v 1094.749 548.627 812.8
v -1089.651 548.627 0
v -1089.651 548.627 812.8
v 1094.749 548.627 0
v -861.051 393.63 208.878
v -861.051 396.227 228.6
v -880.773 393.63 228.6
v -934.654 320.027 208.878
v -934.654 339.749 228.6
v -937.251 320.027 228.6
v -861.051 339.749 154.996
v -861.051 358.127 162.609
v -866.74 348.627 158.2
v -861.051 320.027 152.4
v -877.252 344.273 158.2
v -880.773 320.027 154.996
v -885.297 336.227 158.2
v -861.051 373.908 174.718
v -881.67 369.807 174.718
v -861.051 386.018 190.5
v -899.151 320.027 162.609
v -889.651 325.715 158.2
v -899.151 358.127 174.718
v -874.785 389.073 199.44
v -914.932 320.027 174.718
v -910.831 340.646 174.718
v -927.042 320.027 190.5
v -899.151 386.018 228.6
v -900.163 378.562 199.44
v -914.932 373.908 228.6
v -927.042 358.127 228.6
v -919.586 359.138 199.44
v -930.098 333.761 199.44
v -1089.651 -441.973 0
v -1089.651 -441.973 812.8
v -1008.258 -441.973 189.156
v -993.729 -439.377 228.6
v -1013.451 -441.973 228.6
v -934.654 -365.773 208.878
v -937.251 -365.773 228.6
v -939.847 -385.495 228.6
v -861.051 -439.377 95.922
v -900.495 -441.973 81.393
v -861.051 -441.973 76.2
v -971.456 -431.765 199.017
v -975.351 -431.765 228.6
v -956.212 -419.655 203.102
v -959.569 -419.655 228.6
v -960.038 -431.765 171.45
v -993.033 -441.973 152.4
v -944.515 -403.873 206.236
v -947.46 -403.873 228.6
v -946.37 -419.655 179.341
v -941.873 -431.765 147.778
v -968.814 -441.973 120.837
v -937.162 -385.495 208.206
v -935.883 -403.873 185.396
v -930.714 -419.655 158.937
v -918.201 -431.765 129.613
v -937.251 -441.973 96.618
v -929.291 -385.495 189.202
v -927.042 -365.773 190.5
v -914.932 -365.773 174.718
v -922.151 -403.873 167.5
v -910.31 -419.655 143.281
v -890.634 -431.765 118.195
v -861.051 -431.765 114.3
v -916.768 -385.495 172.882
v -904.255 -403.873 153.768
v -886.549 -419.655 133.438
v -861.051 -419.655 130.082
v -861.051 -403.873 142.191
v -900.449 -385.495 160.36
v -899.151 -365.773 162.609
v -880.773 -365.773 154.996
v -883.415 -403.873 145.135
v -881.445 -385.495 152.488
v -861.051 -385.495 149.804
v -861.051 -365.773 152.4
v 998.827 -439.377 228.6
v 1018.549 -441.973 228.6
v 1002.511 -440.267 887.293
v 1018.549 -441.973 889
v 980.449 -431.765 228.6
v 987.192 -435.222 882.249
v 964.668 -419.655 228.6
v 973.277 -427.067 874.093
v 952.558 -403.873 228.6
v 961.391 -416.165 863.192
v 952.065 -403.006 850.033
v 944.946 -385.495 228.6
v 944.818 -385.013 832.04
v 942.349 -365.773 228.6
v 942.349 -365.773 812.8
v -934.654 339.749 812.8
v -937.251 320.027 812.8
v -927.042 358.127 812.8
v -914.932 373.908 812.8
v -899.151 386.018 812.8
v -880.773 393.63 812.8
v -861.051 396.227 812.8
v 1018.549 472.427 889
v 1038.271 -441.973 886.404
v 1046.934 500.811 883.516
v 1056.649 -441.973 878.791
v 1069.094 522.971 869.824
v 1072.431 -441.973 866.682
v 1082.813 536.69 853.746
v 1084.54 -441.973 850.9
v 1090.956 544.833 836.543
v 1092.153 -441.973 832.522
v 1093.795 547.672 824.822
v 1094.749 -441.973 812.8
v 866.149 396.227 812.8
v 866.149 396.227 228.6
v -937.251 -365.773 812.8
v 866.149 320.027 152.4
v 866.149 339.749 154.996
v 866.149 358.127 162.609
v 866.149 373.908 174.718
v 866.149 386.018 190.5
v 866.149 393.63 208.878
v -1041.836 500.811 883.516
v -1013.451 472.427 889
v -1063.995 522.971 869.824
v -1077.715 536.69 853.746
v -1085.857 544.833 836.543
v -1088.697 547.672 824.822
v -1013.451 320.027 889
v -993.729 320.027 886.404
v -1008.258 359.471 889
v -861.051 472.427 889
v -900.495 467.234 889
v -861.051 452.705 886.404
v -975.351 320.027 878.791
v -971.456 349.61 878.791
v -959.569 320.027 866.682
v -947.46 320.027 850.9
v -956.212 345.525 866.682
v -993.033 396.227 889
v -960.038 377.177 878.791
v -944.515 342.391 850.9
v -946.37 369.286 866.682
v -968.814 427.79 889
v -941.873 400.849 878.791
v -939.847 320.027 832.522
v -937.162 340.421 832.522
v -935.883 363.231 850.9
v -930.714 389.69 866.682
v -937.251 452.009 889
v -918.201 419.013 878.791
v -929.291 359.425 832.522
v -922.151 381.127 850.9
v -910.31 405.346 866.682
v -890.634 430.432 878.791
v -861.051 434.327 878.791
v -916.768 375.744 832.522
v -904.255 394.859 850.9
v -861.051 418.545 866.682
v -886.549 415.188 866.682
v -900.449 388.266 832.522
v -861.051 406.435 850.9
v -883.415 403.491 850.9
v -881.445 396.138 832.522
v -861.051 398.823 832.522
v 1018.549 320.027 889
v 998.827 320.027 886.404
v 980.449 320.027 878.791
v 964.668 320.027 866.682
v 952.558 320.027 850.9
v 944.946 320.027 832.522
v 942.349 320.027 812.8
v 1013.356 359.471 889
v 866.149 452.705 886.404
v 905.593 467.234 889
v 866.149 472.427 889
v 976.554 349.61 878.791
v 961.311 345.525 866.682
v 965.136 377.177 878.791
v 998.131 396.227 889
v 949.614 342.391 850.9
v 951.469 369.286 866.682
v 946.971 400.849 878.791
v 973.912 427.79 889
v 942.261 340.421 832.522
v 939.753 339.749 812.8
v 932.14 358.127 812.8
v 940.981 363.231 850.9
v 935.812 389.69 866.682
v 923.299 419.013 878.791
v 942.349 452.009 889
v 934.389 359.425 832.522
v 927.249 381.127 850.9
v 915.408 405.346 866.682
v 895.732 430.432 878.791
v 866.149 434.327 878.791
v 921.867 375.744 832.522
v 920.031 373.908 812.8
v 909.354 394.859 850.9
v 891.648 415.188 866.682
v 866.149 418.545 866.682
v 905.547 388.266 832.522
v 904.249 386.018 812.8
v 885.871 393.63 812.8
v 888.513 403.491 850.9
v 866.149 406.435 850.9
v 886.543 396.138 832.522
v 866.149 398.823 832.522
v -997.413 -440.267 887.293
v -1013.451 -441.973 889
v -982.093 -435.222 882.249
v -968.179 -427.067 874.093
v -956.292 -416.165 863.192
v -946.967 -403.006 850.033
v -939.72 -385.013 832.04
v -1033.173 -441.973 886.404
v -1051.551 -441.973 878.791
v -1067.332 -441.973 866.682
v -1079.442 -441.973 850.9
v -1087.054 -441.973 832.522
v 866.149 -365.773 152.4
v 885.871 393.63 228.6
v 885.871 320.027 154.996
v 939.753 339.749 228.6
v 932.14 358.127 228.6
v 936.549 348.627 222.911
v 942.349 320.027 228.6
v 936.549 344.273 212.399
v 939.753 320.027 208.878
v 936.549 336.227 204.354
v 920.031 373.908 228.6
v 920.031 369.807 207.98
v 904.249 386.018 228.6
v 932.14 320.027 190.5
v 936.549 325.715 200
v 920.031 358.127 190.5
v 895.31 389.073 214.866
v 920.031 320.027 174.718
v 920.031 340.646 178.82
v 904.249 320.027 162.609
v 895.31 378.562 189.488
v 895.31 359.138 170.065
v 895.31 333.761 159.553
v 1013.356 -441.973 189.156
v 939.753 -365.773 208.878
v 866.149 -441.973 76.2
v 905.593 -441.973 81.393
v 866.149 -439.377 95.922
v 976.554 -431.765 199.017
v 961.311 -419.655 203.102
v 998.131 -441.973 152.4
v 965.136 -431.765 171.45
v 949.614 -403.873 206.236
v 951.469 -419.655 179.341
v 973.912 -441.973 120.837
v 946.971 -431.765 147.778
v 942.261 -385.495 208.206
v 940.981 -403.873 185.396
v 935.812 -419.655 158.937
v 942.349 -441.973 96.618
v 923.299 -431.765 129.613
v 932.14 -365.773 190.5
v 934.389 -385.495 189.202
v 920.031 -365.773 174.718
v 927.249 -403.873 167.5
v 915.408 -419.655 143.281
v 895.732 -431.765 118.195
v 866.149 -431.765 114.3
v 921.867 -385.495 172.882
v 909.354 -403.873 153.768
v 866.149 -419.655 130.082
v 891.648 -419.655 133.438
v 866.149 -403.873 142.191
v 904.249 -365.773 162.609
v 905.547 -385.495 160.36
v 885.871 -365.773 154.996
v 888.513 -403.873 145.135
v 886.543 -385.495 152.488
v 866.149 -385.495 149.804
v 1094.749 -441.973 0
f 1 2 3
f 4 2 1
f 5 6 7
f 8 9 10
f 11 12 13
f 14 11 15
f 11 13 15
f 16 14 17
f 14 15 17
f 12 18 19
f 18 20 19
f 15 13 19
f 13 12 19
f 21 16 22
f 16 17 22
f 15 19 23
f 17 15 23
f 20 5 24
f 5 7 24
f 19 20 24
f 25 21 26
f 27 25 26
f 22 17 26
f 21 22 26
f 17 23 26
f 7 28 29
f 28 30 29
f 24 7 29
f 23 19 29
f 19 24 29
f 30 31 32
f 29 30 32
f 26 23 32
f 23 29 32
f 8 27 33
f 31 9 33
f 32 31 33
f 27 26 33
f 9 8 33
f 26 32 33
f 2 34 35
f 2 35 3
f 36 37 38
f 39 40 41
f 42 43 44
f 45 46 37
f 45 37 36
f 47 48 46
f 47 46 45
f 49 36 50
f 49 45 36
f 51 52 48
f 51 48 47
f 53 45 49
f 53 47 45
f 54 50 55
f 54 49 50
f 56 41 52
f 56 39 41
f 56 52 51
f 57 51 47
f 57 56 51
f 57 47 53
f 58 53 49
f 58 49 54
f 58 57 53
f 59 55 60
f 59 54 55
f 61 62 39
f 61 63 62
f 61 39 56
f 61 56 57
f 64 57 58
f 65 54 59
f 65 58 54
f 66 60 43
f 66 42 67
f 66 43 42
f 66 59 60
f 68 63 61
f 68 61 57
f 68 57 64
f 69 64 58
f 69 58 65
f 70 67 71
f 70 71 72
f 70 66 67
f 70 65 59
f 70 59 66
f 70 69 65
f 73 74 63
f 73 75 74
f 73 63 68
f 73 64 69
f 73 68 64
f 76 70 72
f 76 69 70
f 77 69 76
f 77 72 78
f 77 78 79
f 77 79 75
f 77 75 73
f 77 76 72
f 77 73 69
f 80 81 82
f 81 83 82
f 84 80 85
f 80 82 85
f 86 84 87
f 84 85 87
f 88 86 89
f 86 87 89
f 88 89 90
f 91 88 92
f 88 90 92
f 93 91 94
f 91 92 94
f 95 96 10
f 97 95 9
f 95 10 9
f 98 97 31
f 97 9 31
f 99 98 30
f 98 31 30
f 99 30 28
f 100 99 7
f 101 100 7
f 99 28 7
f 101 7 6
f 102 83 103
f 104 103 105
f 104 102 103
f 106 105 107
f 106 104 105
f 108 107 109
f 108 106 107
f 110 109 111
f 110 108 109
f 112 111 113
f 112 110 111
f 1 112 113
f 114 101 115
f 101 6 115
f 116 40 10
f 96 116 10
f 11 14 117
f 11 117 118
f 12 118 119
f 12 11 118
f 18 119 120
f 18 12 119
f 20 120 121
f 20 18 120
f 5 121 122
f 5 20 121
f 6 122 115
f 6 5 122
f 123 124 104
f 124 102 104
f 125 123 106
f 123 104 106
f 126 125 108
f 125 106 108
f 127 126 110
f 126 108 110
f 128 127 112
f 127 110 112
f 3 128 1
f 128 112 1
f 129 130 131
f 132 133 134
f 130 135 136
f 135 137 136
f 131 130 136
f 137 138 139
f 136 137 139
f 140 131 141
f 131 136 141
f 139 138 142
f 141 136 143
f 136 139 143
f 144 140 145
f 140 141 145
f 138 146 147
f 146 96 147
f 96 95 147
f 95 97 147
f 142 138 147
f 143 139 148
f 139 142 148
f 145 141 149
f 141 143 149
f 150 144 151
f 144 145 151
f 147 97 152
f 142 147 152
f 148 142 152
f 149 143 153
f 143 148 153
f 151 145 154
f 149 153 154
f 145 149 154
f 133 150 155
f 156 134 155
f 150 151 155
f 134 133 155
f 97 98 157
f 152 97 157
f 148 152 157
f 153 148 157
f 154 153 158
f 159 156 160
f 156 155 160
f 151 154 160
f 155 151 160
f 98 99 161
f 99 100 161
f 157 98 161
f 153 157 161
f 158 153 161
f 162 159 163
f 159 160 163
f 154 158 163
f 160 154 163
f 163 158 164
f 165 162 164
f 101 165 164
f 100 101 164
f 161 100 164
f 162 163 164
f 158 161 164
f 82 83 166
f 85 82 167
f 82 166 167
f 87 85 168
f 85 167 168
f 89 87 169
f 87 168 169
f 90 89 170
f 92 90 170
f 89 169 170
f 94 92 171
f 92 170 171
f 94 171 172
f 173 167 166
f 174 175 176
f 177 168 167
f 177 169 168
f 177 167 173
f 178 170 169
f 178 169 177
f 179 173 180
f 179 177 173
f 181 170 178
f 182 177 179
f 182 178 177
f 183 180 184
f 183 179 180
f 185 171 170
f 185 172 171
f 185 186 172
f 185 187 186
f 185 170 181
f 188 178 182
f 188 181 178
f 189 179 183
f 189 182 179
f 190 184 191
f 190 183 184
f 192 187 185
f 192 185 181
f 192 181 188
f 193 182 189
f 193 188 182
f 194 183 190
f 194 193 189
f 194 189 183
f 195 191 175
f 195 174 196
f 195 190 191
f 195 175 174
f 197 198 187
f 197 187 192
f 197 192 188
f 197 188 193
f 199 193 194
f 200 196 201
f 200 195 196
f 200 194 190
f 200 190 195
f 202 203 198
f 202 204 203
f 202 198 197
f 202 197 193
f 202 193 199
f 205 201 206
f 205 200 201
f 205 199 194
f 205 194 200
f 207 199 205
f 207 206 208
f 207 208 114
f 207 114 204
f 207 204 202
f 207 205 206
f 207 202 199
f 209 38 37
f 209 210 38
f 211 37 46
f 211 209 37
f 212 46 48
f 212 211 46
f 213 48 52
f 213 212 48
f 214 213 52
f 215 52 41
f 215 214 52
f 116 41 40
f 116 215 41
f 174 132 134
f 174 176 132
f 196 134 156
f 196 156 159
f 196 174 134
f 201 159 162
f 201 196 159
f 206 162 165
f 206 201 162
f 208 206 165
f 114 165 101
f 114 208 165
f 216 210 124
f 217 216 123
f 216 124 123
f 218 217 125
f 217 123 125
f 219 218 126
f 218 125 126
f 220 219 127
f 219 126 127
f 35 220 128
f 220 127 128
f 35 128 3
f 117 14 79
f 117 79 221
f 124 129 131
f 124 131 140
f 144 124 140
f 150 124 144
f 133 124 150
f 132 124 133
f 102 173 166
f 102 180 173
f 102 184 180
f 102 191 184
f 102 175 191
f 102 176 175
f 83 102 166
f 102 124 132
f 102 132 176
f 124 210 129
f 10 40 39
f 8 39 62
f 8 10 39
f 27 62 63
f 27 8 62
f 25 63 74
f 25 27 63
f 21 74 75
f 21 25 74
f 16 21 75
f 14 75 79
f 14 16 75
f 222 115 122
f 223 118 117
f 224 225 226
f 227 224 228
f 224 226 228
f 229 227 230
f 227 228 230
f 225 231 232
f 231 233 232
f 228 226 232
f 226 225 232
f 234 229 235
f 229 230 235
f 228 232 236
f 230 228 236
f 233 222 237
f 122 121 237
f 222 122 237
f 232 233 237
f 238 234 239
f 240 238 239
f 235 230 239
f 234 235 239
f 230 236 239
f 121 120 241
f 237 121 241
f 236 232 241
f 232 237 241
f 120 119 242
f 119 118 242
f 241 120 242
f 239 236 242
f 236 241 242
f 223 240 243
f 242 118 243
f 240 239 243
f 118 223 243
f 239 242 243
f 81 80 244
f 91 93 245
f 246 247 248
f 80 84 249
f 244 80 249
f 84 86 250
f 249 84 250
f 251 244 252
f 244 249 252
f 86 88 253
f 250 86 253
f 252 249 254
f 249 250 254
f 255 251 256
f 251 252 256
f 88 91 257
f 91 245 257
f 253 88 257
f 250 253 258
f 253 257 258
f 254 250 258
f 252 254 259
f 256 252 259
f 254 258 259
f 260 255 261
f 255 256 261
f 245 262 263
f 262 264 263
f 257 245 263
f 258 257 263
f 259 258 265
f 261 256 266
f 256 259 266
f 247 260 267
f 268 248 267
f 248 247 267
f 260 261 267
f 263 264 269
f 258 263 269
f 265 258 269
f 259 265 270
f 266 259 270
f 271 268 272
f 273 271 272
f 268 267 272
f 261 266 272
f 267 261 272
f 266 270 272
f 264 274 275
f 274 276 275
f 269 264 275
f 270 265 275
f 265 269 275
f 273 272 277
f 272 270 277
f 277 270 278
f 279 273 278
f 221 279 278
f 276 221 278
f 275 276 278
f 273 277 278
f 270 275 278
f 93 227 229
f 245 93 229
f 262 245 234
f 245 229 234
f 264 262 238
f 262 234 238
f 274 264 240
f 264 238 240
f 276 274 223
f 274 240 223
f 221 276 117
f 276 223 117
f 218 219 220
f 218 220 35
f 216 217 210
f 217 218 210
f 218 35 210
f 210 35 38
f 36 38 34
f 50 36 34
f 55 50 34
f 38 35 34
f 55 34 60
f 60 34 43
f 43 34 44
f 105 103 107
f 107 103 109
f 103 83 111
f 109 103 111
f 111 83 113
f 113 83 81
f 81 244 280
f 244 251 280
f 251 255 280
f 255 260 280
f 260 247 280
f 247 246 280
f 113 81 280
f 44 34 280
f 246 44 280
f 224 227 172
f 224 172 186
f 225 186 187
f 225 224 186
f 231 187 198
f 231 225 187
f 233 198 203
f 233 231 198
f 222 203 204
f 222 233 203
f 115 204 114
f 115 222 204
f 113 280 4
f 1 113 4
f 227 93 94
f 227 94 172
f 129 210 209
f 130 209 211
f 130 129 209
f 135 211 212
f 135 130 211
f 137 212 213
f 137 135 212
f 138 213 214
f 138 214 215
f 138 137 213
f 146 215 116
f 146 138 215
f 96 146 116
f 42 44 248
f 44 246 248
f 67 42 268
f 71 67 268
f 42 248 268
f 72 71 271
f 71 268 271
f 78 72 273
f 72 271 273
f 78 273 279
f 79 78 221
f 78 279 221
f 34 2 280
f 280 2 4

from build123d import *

# Parameters (mm, degrees)
F0_W     = 2184.4
F0_H     = 990.6
F1_DEPTH = 889
F2_T     = -152.4
F3_R     = 76.2
F4_R     = 76.19999


# Not quite as in the source:
# - a fillet or chamfer is up to 0.001 mm smaller than in the source, because OpenCascade refuses the exact size


with BuildPart() as f1:
    # F0 (on Top) → F1 (new body)
    with BuildSketch(Plane.XY):
        with Locations((2.5491379201, 53.3265618357)):
            Rectangle(F0_W, F0_H)
    extrude(amount=F1_DEPTH)

    # F2
    f2_openings = [f1.faces().sort_by_distance(p)[0] for p in [
        (2.549138, 53.326562, 889),
        (2.549138, -441.973438, 444.5),
    ]]
    offset(amount=F2_T, openings=f2_openings)

    # F3
    f3_edges = [f1.edges().sort_by_distance(p)[0] for p in [
        (2.549138, 396.226562, 889),
        (-937.250862, 396.226562, 520.7),
        (2.549138, 396.226562, 152.4),
        (942.349138, 396.226562, 520.7),
        (2.549138, -441.973438, 152.4),
        (942.349138, -22.873438, 152.4),
        (-937.250862, -22.873438, 152.4),
        (-937.250862, -441.973438, 520.7),
        (-937.250862, -22.873438, 889),
        (942.349138, -441.973438, 520.7),
        (942.349138, -22.873438, 889),
    ]]
    fillet(f3_edges, radius=F3_R)

    # F4 (radius 76.2 in the source; OpenCascade refuses exactly that, so slightly less here)
    f4_edges = [f1.edges().sort_by_distance(p)[0] for p in [
        (1094.749138, 53.326562, 889),
        (2.549138, 548.626562, 889),
        (-1089.650862, 53.326562, 889),
    ]]
    fillet(f4_edges, radius=F4_R)


solid = f1.part
